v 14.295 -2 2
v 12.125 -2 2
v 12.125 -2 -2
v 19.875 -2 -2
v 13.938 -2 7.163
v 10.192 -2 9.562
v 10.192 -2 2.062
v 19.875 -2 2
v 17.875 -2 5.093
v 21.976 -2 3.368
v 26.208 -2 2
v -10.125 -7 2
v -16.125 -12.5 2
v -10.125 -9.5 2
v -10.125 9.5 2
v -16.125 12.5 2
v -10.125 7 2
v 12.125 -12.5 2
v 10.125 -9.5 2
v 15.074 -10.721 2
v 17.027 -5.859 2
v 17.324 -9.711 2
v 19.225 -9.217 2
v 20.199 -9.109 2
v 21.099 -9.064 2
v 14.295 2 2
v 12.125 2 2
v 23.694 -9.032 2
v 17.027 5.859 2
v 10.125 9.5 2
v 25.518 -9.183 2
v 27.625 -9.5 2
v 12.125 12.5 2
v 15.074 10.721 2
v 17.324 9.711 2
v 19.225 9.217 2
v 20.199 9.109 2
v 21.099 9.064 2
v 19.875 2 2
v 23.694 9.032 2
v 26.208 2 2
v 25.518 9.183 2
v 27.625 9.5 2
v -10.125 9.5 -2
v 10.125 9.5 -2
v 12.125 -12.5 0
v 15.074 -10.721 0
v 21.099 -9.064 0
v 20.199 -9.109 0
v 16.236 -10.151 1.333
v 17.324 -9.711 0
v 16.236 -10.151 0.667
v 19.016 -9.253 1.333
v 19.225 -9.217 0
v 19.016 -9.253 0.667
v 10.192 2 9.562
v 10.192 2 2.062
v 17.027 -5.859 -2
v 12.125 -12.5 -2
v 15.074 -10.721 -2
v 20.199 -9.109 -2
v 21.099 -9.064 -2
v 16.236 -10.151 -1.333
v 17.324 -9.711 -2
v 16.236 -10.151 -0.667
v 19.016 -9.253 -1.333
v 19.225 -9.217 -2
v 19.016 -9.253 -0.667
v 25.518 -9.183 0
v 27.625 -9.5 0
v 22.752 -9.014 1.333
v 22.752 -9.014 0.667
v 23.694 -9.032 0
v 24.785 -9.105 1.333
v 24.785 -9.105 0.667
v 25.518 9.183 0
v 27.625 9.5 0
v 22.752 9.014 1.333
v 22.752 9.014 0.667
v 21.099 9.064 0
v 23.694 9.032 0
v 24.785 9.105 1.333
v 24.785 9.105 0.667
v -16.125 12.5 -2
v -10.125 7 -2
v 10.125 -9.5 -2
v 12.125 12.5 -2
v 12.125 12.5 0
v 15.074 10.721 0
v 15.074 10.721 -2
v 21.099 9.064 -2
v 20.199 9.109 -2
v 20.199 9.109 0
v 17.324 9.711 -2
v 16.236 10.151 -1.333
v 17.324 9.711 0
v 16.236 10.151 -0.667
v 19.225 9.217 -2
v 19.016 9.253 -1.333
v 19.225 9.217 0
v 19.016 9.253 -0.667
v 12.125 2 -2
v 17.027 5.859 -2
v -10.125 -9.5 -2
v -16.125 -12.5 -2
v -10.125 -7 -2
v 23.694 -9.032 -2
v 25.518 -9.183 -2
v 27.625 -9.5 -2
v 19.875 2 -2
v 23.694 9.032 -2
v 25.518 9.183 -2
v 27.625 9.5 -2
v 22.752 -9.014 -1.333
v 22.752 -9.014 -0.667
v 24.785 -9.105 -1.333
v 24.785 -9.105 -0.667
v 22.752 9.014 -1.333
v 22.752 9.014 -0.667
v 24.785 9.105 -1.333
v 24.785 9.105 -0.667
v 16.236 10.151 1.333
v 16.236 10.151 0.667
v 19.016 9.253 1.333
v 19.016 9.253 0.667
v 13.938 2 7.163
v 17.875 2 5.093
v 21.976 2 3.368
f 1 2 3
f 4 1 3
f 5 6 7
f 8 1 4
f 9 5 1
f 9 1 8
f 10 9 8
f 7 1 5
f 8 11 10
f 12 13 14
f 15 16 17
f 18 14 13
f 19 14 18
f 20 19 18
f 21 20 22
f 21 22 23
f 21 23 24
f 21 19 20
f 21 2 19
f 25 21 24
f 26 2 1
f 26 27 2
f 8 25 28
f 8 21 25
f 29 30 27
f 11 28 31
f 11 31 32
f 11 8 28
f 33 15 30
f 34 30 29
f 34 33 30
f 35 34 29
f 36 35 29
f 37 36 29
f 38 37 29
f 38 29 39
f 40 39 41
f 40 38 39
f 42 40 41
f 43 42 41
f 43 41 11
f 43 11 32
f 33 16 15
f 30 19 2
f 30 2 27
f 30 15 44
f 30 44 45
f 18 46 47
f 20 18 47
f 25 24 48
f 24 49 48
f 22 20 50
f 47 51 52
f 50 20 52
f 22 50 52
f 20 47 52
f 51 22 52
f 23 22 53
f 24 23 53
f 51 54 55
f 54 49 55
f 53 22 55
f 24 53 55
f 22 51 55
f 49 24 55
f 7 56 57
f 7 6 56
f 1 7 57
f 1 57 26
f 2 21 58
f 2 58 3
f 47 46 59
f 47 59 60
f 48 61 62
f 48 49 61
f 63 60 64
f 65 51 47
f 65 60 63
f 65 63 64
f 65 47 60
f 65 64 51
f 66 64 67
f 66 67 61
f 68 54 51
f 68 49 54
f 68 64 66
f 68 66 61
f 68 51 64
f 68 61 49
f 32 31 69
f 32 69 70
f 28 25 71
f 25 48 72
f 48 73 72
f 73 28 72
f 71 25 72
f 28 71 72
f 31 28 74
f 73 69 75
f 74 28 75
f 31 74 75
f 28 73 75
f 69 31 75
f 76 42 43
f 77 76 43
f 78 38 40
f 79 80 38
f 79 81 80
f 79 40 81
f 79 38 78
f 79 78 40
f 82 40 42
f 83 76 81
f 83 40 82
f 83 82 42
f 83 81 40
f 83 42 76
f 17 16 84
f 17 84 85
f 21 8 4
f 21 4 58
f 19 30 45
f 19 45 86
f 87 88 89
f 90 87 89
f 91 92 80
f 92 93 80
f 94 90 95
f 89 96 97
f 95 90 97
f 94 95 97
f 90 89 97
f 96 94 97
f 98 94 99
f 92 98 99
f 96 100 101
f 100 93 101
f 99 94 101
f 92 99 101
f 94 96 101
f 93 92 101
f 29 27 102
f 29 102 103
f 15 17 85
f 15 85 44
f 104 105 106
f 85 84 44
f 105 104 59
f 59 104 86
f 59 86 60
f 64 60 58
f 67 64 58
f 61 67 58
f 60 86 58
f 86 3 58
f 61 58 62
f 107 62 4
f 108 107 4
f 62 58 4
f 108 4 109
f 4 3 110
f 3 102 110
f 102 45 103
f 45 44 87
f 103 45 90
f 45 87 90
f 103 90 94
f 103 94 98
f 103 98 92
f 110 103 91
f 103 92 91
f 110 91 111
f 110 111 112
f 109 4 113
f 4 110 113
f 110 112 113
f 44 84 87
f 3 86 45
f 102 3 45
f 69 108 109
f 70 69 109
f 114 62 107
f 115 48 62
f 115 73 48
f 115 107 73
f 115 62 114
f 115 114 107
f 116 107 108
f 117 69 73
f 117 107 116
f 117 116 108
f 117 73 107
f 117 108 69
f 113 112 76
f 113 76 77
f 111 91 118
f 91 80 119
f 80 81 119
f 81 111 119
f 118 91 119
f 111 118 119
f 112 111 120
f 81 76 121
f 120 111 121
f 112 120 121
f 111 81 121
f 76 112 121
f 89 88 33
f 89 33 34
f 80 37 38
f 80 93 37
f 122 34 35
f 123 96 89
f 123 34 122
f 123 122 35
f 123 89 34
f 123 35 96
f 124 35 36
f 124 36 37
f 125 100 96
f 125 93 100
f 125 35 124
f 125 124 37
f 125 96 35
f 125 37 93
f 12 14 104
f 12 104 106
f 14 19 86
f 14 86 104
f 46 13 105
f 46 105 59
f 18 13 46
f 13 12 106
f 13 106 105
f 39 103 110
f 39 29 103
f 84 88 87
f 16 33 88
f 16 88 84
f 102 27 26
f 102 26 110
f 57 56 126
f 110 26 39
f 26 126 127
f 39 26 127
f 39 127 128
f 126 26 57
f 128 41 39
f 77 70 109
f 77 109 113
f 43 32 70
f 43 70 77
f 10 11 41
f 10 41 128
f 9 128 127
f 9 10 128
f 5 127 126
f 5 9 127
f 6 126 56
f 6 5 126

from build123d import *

# Parameters (mm, degrees)
F1_DEPTH = 2
F3_DEPTH = 2


with BuildPart() as f1:
    # F0 (on Top) → F1 (new body, symmetric)
    with BuildSketch(Plane.XY):
        Polygon((10.125, 9.5), (10.125, -9.5), (-10.125, -9.5), (-10.125, -7), (-16.125, -12.5), (-12.125, -12.5), (12.125, -12.5), (12.125, -2), (12.125, 0), (12.125, 2), (12.125, 12.5), (-12.125, 12.5), (-16.125, 12.5), (-10.125, 7), (-10.125, 9.5), align=None)
        with BuildLine():
            Line((17.0268920894, -5.8587268466), (12.125, -12.5))
            add(Edge.make_bspline(
                [(12.125, -12.5), (17.1111167669, -9.1784531251), (19.154572869, -9.144826131), (21.0990195423, -9.0642701834)],
                knots=[0, 0, 0, 0, 0.5479408527, 0.5479408527, 0.5479408527, 0.5479408527], degree=3))
            Line((21.0990195423, -9.0642701834), (17.0268920894, -5.8587268466))
        make_face()
        Polygon((12.125, -2), (12.125, -12.5), (17.0268920894, -5.8587268466), align=None)
        Polygon((12.125, 0), (12.125, -2), (19.875, -2), (27.625, -2), (27.625, 0), align=None)
        with BuildLine():
            Line((23.9668667925, -5.9598710895), (21.0990195423, -9.0642701834))
            add(Edge.make_bspline(
                [(21.0990195423, -9.0642701834), (22.7032162376, -8.9978103588), (24.2400222719, -8.8994083926), (27.625, -9.5)],
                knots=[0.5479408527, 0.5479408527, 0.5479408527, 0.5479408527, 1, 1, 1, 1], degree=3))
            Line((27.625, -9.5), (23.9668667925, -5.9598710895))
        make_face()
        Polygon((17.0268920894, -5.8587268466), (21.0990195423, -9.0642701834), (23.9668667925, -5.9598710895), (19.875, -2), align=None)
        Polygon((17.0268920894, 5.8587268466), (12.125, 12.5), (12.125, 2), align=None)
        with BuildLine():
            add(Edge.make_bspline(
                [(12.125, 12.5), (17.1111167669, 9.1784531251), (19.154572869, 9.144826131), (21.0990195423, 9.0642701834)],
                knots=[0, 0, 0, 0, 0.5479408527, 0.5479408527, 0.5479408527, 0.5479408527], degree=3))
            Line((12.125, 12.5), (17.0268920894, 5.8587268466))
            Line((17.0268920894, 5.8587268466), (21.0990195423, 9.0642701834))
        make_face()
        Polygon((12.125, 2), (12.125, 0), (27.625, 0), (27.625, 2), (19.875, 2), align=None)
        Polygon((27.625, -2), (19.875, -2), (23.9668667925, -5.9598710895), align=None)
        Polygon((23.9668667925, -5.9598710895), (27.625, -9.5), (27.625, -2), align=None)
        Polygon((23.9668667925, 5.9598710895), (21.0990195423, 9.0642701834), (17.0268920894, 5.8587268466), (19.875, 2), align=None)
        with BuildLine():
            add(Edge.make_bspline(
                [(21.0990195423, 9.0642701834), (22.7032162376, 8.9978103588), (24.2400222719, 8.8994083926), (27.625, 9.5)],
                knots=[0.5479408527, 0.5479408527, 0.5479408527, 0.5479408527, 1, 1, 1, 1], degree=3))
            Line((21.0990195423, 9.0642701834), (23.9668667925, 5.9598710895))
            Line((23.9668667925, 5.9598710895), (27.625, 9.5))
        make_face()
        Polygon((23.9668667925, 5.9598710895), (19.875, 2), (27.625, 2), align=None)
        Polygon((27.625, 2), (27.625, 9.5), (23.9668667925, 5.9598710895), align=None)
    extrude(amount=F1_DEPTH, both=True)

    # F2 (on Front) → F3 (join, symmetric)
    with BuildSketch(Plane.XZ):
        with BuildLine():
            Line((10.1918056607, 9.5617884584), (10.1918056607, 2.0617884584))
            Line((10.1918056607, 2.0617884584), (26.9152931869, 1.8099824665))
            ThreePointArc((26.9152931869, 1.8099824665), (18.2067231126, 4.9376539541), (10.1918056607, 9.5617884584))
        make_face()
    extrude(amount=F3_DEPTH, both=True)


solid = f1.part
